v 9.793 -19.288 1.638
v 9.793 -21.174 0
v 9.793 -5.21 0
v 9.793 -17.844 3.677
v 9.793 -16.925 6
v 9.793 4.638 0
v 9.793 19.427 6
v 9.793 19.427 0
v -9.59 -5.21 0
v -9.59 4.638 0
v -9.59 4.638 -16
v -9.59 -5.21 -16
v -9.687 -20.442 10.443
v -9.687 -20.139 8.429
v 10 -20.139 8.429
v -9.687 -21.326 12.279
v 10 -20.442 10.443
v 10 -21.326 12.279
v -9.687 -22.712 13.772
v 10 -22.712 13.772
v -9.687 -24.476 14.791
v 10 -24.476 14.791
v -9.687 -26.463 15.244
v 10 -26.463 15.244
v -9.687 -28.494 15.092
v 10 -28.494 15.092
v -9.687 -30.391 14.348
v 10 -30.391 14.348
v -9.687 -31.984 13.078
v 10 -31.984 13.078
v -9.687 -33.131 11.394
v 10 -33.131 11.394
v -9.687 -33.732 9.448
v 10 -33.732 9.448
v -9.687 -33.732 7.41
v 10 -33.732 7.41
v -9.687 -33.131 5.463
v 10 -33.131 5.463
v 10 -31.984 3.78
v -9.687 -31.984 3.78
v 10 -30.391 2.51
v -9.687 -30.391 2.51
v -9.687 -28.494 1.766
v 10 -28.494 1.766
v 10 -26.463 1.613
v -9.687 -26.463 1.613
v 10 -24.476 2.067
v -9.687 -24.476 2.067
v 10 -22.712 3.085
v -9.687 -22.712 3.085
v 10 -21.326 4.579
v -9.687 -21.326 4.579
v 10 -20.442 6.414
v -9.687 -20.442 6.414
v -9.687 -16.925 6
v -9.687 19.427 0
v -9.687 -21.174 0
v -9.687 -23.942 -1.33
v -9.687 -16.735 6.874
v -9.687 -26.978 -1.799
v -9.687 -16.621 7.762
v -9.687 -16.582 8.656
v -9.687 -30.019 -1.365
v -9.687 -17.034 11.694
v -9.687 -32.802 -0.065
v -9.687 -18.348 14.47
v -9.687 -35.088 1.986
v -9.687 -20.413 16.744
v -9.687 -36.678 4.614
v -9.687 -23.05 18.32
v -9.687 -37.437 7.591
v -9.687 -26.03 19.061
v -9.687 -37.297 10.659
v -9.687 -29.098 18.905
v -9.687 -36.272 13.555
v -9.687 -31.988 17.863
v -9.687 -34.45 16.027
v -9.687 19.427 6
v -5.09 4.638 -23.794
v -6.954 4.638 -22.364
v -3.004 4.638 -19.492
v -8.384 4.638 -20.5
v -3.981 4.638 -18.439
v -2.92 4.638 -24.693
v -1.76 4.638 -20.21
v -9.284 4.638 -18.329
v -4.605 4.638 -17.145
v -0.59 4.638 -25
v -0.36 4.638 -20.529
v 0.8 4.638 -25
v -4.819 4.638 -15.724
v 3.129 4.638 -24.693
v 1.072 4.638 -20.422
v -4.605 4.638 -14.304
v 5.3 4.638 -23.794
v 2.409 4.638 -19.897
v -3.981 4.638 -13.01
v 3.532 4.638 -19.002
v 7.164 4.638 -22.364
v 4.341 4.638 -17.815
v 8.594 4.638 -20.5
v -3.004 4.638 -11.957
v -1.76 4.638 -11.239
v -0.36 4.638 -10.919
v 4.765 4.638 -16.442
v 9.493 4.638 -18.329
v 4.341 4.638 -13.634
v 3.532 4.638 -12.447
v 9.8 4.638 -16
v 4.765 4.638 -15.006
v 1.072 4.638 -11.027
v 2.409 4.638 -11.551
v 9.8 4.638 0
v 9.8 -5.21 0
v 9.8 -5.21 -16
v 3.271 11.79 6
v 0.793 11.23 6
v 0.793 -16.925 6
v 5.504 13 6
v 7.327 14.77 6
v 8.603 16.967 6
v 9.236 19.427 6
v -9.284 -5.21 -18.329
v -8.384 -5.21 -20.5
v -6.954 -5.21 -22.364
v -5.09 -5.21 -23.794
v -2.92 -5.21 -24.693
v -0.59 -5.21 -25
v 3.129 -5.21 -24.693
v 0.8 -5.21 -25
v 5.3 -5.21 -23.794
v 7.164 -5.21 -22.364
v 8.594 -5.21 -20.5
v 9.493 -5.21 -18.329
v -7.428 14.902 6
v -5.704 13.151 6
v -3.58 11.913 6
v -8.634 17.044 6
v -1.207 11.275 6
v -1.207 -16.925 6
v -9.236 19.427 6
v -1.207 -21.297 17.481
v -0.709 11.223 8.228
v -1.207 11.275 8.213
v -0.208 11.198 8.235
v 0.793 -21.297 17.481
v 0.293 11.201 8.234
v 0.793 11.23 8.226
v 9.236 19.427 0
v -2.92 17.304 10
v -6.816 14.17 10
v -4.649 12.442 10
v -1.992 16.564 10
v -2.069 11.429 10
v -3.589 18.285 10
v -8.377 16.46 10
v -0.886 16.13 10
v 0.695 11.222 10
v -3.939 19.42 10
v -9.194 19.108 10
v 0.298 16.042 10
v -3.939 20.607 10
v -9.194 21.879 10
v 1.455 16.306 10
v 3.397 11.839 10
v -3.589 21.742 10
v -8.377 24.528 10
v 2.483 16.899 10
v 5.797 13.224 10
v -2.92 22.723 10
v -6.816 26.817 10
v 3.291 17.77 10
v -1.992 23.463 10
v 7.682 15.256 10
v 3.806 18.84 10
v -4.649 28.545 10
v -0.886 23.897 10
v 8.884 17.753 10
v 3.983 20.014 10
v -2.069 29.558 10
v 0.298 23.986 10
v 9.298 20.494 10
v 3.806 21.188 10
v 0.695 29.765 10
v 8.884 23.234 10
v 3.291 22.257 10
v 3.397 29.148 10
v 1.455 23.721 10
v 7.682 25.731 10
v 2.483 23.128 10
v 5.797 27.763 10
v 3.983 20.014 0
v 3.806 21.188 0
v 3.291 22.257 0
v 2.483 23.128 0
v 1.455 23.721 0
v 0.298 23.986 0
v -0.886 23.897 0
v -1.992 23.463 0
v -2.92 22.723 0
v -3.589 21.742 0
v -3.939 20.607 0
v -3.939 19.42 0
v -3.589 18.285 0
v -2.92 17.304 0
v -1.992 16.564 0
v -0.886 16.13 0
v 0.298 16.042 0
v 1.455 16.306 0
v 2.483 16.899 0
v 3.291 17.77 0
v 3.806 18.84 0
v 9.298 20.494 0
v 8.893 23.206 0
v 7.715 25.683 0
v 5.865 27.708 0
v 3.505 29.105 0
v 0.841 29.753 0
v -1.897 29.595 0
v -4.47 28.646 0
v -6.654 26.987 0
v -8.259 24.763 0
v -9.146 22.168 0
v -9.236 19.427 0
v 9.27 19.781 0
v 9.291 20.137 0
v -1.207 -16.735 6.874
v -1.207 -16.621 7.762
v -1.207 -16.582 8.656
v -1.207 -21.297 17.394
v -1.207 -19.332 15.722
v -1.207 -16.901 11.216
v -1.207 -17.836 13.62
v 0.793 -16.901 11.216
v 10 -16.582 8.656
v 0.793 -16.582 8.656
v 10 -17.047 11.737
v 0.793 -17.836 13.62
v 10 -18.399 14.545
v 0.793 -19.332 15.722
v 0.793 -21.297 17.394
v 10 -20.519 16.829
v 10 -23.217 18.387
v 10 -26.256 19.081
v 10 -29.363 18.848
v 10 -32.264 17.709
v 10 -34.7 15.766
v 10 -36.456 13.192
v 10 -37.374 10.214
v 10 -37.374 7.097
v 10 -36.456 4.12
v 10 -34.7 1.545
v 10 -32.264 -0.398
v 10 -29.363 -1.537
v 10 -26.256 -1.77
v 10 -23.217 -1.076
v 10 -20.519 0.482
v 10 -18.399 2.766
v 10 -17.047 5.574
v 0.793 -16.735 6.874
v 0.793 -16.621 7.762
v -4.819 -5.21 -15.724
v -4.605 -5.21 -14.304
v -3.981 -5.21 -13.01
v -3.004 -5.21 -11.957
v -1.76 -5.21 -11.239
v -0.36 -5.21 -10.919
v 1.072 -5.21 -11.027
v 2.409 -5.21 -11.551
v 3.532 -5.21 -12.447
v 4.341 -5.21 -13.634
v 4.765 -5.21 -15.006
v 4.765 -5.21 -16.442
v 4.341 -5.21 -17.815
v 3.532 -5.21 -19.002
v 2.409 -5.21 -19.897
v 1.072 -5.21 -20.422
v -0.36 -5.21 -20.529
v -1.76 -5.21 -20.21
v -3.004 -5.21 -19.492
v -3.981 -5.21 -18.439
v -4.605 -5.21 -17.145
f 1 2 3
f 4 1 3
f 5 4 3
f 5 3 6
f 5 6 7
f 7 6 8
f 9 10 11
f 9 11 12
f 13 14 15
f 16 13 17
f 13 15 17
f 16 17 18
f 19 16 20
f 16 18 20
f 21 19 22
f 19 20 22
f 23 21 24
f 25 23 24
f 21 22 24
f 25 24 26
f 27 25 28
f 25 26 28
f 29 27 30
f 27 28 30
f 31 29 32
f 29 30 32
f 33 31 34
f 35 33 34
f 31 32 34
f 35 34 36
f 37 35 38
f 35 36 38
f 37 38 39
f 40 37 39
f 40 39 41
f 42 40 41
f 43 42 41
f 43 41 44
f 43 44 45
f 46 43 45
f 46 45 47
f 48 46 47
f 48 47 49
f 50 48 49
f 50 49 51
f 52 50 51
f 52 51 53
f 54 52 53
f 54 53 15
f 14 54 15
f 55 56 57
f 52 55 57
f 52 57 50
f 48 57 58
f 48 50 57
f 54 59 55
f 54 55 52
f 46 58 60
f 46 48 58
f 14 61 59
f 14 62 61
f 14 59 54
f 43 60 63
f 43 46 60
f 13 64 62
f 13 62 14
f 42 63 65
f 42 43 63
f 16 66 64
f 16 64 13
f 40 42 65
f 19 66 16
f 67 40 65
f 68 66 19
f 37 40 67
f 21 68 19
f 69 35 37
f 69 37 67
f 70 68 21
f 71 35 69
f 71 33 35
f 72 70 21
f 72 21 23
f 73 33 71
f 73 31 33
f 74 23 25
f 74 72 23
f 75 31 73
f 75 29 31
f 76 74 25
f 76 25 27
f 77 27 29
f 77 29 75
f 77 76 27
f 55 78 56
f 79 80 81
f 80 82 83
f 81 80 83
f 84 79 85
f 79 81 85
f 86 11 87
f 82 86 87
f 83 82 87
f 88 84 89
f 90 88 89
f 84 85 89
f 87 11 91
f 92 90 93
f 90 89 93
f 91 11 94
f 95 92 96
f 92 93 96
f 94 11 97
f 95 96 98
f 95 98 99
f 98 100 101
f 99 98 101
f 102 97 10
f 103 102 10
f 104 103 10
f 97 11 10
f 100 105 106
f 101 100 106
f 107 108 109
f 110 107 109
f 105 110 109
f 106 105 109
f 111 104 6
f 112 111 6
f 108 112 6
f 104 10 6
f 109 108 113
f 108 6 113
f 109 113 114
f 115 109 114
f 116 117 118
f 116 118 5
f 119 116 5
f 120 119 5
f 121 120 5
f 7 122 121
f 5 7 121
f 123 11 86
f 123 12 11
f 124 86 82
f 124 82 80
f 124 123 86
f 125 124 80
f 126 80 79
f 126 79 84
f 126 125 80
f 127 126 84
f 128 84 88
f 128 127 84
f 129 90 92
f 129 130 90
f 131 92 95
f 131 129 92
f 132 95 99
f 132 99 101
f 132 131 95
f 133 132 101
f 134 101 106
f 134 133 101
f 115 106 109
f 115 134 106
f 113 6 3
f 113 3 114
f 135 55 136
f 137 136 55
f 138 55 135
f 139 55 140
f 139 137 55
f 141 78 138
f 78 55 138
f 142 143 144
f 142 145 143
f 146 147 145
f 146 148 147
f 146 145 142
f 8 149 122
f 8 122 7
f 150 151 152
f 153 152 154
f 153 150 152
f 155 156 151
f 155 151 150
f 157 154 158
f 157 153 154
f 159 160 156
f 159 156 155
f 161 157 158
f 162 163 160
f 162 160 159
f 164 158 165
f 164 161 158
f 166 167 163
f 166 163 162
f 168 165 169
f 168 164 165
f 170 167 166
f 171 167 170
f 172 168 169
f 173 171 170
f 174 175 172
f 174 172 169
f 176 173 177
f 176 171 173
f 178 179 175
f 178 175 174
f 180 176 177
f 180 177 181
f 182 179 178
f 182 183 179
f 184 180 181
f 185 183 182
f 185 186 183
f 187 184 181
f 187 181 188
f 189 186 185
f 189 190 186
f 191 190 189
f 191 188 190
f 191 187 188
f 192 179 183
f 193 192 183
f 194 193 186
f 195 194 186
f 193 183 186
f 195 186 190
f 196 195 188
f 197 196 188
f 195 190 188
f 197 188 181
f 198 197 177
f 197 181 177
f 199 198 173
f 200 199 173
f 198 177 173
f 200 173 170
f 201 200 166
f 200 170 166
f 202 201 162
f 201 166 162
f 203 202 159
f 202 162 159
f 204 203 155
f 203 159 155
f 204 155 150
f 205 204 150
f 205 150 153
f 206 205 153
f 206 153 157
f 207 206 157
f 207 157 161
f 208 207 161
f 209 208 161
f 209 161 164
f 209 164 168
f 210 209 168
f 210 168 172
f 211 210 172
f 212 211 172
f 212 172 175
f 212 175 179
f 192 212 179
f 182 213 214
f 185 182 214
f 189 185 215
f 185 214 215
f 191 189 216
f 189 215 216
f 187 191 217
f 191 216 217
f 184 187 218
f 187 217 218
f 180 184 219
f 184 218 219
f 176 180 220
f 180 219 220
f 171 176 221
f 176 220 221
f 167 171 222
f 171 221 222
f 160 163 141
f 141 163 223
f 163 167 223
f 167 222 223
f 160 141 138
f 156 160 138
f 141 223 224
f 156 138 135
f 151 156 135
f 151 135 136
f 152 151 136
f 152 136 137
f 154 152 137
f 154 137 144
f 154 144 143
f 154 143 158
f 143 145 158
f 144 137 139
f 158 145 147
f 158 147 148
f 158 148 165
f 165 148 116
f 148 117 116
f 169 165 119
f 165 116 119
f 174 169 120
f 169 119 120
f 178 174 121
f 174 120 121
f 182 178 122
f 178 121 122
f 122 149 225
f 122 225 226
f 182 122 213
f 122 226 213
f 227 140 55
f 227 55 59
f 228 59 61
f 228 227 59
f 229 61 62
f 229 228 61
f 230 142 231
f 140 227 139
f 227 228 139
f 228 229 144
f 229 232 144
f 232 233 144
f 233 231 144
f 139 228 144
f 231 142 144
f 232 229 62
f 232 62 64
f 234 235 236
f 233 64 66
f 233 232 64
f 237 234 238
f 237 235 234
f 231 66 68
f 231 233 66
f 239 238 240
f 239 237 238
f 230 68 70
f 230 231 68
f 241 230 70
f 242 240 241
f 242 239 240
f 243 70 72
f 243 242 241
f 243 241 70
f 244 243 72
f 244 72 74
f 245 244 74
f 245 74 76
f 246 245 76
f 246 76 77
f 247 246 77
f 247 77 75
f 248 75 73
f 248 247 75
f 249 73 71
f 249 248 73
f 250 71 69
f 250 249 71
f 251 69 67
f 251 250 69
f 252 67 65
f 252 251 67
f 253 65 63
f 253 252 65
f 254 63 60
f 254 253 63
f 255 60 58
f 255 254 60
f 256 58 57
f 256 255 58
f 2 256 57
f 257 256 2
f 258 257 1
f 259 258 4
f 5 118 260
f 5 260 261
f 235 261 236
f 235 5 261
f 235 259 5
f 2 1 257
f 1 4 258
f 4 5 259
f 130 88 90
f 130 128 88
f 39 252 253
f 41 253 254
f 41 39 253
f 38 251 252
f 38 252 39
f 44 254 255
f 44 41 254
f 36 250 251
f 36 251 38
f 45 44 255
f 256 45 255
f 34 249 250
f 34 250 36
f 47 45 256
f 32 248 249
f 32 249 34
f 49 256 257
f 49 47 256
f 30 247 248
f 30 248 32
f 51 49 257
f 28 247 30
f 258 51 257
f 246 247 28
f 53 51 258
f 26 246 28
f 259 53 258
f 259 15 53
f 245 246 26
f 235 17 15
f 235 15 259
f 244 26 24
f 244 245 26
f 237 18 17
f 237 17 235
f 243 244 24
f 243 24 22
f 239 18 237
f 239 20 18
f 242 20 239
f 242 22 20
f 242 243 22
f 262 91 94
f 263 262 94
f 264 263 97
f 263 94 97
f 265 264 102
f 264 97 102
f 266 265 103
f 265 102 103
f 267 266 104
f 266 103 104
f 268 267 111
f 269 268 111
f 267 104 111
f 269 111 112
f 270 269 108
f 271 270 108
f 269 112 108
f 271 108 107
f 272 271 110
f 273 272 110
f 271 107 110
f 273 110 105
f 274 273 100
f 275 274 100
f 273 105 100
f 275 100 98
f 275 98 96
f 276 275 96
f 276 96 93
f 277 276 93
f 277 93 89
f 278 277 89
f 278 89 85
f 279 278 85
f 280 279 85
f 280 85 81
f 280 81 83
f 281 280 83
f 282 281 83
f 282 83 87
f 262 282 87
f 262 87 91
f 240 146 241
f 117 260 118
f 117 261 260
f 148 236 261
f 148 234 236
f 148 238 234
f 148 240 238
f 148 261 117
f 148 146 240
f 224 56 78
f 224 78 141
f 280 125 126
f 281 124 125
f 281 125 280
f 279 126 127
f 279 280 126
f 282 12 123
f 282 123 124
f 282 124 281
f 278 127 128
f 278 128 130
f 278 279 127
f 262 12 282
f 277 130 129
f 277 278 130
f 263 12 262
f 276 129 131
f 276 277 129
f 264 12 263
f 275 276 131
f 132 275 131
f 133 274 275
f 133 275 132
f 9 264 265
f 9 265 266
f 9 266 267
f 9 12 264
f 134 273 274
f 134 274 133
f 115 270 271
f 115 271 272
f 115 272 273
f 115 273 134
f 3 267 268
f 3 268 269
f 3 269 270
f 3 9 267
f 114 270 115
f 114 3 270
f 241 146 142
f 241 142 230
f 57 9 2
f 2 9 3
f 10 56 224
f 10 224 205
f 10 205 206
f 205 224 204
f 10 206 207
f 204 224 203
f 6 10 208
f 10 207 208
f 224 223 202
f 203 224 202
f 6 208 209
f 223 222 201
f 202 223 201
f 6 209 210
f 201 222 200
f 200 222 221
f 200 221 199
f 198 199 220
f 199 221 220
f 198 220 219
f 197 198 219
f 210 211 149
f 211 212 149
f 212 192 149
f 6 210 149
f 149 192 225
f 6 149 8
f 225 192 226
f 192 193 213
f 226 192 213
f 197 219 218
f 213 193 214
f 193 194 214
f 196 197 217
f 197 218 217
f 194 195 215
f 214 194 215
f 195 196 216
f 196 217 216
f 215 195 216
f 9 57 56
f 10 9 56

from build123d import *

# Parameters (mm, degrees)
SKETCH_W             = 20.859867
SKETCH_H             = 40.764332
PAD_DEPTH            = 6
PAD001_DEPTH         = 1
SKETCH003_R          = 10.454419
PAD002_DEPTH         = 10
SKETCH004_R          = 6.834621
POCKET_DEPTH         = 21.067877
SKETCH005_W          = 8.397711
SKETCH005_H          = 64.60706
POCKET001_DEPTH      = 19.11099
POCKET001_DEPTH_BACK = -1.799848
SKETCH006_R          = 9.297528
PAD003_DEPTH         = 10
SKETCH007_R          = 3.983177
POCKET002_DEPTH      = 11.799848
SKETCH008_W          = 19.389837
SKETCH008_H          = 9.84828
PAD004_DEPTH         = 25
FILLET_R             = 9
SKETCH009_R          = 4.818609
POCKET003_DEPTH      = 15


with BuildPart() as part:
    # Sketch → Pad (new body)
    with BuildSketch(Plane.XY):
        with Locations((-0.636944, -0.955416)):
            Rectangle(SKETCH_W, SKETCH_H)
    extrude(amount=PAD_DEPTH)

    # Sketch002 (on Face2 of Pad) → Pad001 (join, symmetric)
    with BuildSketch(Plane(origin=(-0.20701, 0, -0.1), x_dir=(0, 1, 0), z_dir=(1, 0, 0))):
        Polygon((-21.297264, 17.580976), (-21.297264, 6.008283), (19.375914, 6.008283), align=None)
    extrude(amount=PAD001_DEPTH, both=True)

    # Sketch003 → Pad002 (join, symmetric)
    with BuildSketch(Plane.YZ):
        with Locations((-27.036768, 8.655571)):
            Circle(SKETCH003_R)
    extrude(amount=PAD002_DEPTH, both=True)

    # Sketch004 (on Face13 of Pad002) → Pocket (cut, through all)
    with BuildSketch(Plane.YZ.offset(10)):
        with Locations((-26.973387, 8.428857)):
            Circle(SKETCH004_R)
    extrude(amount=-POCKET_DEPTH, mode=Mode.SUBTRACT)

    # Sketch005 (on Face4 of Pocket) → Pocket001 (cut, two sides)
    with BuildSketch(Plane(origin=(0, 0, 0), x_dir=(1, 0, 0), z_dir=(0, 0, -1))) as pocket001_sk:
        with Locations((-13.88562, 8.634939)):
            Rectangle(SKETCH005_W, SKETCH005_H)
    extrude(amount=-POCKET001_DEPTH, mode=Mode.SUBTRACT)
    extrude(pocket001_sk.sketch, amount=-POCKET001_DEPTH_BACK, mode=Mode.SUBTRACT)

    # Sketch006 → Pad003 (join)
    with BuildSketch(Plane.XY):
        with Locations((0, 20.493547)):
            Circle(SKETCH006_R)
    extrude(amount=PAD003_DEPTH)

    # Sketch007 (on Face15 of Pad003) → Pocket002 (cut, through all)
    with BuildSketch(Plane.XY.offset(10)):
        with Locations((0, 20.013571)):
            Circle(SKETCH007_R)
    extrude(amount=-POCKET002_DEPTH, mode=Mode.SUBTRACT)

    # Sketch008 (on Face2 of Pocket002) → Pad004 (join)
    with BuildSketch(Plane(origin=(0, 0, 0), x_dir=(1, 0, 0), z_dir=(0, 0, -1))):
        with Locations((0.104674, 0.286196)):
            Rectangle(SKETCH008_W, SKETCH008_H)
    extrude(amount=PAD004_DEPTH)

    # Fillet
    fillet_edges = [part.edges().sort_by_distance(p)[0] for p in [
        (-9.590244, -0.286196, -25),
        (9.799593, -0.286196, -25),
    ]]
    fillet(fillet_edges, radius=FILLET_R)

    # Sketch009 (on Face1 of Fillet) → Pocket003 (cut)
    with BuildSketch(Plane(origin=(0, 4.637944, 0), x_dir=(-1, 0, 0), z_dir=(0, 1, 0))):
        with Locations((0, -15.724321)):
            Circle(SKETCH009_R)
    extrude(amount=-POCKET003_DEPTH, mode=Mode.SUBTRACT)


solid = part.part
